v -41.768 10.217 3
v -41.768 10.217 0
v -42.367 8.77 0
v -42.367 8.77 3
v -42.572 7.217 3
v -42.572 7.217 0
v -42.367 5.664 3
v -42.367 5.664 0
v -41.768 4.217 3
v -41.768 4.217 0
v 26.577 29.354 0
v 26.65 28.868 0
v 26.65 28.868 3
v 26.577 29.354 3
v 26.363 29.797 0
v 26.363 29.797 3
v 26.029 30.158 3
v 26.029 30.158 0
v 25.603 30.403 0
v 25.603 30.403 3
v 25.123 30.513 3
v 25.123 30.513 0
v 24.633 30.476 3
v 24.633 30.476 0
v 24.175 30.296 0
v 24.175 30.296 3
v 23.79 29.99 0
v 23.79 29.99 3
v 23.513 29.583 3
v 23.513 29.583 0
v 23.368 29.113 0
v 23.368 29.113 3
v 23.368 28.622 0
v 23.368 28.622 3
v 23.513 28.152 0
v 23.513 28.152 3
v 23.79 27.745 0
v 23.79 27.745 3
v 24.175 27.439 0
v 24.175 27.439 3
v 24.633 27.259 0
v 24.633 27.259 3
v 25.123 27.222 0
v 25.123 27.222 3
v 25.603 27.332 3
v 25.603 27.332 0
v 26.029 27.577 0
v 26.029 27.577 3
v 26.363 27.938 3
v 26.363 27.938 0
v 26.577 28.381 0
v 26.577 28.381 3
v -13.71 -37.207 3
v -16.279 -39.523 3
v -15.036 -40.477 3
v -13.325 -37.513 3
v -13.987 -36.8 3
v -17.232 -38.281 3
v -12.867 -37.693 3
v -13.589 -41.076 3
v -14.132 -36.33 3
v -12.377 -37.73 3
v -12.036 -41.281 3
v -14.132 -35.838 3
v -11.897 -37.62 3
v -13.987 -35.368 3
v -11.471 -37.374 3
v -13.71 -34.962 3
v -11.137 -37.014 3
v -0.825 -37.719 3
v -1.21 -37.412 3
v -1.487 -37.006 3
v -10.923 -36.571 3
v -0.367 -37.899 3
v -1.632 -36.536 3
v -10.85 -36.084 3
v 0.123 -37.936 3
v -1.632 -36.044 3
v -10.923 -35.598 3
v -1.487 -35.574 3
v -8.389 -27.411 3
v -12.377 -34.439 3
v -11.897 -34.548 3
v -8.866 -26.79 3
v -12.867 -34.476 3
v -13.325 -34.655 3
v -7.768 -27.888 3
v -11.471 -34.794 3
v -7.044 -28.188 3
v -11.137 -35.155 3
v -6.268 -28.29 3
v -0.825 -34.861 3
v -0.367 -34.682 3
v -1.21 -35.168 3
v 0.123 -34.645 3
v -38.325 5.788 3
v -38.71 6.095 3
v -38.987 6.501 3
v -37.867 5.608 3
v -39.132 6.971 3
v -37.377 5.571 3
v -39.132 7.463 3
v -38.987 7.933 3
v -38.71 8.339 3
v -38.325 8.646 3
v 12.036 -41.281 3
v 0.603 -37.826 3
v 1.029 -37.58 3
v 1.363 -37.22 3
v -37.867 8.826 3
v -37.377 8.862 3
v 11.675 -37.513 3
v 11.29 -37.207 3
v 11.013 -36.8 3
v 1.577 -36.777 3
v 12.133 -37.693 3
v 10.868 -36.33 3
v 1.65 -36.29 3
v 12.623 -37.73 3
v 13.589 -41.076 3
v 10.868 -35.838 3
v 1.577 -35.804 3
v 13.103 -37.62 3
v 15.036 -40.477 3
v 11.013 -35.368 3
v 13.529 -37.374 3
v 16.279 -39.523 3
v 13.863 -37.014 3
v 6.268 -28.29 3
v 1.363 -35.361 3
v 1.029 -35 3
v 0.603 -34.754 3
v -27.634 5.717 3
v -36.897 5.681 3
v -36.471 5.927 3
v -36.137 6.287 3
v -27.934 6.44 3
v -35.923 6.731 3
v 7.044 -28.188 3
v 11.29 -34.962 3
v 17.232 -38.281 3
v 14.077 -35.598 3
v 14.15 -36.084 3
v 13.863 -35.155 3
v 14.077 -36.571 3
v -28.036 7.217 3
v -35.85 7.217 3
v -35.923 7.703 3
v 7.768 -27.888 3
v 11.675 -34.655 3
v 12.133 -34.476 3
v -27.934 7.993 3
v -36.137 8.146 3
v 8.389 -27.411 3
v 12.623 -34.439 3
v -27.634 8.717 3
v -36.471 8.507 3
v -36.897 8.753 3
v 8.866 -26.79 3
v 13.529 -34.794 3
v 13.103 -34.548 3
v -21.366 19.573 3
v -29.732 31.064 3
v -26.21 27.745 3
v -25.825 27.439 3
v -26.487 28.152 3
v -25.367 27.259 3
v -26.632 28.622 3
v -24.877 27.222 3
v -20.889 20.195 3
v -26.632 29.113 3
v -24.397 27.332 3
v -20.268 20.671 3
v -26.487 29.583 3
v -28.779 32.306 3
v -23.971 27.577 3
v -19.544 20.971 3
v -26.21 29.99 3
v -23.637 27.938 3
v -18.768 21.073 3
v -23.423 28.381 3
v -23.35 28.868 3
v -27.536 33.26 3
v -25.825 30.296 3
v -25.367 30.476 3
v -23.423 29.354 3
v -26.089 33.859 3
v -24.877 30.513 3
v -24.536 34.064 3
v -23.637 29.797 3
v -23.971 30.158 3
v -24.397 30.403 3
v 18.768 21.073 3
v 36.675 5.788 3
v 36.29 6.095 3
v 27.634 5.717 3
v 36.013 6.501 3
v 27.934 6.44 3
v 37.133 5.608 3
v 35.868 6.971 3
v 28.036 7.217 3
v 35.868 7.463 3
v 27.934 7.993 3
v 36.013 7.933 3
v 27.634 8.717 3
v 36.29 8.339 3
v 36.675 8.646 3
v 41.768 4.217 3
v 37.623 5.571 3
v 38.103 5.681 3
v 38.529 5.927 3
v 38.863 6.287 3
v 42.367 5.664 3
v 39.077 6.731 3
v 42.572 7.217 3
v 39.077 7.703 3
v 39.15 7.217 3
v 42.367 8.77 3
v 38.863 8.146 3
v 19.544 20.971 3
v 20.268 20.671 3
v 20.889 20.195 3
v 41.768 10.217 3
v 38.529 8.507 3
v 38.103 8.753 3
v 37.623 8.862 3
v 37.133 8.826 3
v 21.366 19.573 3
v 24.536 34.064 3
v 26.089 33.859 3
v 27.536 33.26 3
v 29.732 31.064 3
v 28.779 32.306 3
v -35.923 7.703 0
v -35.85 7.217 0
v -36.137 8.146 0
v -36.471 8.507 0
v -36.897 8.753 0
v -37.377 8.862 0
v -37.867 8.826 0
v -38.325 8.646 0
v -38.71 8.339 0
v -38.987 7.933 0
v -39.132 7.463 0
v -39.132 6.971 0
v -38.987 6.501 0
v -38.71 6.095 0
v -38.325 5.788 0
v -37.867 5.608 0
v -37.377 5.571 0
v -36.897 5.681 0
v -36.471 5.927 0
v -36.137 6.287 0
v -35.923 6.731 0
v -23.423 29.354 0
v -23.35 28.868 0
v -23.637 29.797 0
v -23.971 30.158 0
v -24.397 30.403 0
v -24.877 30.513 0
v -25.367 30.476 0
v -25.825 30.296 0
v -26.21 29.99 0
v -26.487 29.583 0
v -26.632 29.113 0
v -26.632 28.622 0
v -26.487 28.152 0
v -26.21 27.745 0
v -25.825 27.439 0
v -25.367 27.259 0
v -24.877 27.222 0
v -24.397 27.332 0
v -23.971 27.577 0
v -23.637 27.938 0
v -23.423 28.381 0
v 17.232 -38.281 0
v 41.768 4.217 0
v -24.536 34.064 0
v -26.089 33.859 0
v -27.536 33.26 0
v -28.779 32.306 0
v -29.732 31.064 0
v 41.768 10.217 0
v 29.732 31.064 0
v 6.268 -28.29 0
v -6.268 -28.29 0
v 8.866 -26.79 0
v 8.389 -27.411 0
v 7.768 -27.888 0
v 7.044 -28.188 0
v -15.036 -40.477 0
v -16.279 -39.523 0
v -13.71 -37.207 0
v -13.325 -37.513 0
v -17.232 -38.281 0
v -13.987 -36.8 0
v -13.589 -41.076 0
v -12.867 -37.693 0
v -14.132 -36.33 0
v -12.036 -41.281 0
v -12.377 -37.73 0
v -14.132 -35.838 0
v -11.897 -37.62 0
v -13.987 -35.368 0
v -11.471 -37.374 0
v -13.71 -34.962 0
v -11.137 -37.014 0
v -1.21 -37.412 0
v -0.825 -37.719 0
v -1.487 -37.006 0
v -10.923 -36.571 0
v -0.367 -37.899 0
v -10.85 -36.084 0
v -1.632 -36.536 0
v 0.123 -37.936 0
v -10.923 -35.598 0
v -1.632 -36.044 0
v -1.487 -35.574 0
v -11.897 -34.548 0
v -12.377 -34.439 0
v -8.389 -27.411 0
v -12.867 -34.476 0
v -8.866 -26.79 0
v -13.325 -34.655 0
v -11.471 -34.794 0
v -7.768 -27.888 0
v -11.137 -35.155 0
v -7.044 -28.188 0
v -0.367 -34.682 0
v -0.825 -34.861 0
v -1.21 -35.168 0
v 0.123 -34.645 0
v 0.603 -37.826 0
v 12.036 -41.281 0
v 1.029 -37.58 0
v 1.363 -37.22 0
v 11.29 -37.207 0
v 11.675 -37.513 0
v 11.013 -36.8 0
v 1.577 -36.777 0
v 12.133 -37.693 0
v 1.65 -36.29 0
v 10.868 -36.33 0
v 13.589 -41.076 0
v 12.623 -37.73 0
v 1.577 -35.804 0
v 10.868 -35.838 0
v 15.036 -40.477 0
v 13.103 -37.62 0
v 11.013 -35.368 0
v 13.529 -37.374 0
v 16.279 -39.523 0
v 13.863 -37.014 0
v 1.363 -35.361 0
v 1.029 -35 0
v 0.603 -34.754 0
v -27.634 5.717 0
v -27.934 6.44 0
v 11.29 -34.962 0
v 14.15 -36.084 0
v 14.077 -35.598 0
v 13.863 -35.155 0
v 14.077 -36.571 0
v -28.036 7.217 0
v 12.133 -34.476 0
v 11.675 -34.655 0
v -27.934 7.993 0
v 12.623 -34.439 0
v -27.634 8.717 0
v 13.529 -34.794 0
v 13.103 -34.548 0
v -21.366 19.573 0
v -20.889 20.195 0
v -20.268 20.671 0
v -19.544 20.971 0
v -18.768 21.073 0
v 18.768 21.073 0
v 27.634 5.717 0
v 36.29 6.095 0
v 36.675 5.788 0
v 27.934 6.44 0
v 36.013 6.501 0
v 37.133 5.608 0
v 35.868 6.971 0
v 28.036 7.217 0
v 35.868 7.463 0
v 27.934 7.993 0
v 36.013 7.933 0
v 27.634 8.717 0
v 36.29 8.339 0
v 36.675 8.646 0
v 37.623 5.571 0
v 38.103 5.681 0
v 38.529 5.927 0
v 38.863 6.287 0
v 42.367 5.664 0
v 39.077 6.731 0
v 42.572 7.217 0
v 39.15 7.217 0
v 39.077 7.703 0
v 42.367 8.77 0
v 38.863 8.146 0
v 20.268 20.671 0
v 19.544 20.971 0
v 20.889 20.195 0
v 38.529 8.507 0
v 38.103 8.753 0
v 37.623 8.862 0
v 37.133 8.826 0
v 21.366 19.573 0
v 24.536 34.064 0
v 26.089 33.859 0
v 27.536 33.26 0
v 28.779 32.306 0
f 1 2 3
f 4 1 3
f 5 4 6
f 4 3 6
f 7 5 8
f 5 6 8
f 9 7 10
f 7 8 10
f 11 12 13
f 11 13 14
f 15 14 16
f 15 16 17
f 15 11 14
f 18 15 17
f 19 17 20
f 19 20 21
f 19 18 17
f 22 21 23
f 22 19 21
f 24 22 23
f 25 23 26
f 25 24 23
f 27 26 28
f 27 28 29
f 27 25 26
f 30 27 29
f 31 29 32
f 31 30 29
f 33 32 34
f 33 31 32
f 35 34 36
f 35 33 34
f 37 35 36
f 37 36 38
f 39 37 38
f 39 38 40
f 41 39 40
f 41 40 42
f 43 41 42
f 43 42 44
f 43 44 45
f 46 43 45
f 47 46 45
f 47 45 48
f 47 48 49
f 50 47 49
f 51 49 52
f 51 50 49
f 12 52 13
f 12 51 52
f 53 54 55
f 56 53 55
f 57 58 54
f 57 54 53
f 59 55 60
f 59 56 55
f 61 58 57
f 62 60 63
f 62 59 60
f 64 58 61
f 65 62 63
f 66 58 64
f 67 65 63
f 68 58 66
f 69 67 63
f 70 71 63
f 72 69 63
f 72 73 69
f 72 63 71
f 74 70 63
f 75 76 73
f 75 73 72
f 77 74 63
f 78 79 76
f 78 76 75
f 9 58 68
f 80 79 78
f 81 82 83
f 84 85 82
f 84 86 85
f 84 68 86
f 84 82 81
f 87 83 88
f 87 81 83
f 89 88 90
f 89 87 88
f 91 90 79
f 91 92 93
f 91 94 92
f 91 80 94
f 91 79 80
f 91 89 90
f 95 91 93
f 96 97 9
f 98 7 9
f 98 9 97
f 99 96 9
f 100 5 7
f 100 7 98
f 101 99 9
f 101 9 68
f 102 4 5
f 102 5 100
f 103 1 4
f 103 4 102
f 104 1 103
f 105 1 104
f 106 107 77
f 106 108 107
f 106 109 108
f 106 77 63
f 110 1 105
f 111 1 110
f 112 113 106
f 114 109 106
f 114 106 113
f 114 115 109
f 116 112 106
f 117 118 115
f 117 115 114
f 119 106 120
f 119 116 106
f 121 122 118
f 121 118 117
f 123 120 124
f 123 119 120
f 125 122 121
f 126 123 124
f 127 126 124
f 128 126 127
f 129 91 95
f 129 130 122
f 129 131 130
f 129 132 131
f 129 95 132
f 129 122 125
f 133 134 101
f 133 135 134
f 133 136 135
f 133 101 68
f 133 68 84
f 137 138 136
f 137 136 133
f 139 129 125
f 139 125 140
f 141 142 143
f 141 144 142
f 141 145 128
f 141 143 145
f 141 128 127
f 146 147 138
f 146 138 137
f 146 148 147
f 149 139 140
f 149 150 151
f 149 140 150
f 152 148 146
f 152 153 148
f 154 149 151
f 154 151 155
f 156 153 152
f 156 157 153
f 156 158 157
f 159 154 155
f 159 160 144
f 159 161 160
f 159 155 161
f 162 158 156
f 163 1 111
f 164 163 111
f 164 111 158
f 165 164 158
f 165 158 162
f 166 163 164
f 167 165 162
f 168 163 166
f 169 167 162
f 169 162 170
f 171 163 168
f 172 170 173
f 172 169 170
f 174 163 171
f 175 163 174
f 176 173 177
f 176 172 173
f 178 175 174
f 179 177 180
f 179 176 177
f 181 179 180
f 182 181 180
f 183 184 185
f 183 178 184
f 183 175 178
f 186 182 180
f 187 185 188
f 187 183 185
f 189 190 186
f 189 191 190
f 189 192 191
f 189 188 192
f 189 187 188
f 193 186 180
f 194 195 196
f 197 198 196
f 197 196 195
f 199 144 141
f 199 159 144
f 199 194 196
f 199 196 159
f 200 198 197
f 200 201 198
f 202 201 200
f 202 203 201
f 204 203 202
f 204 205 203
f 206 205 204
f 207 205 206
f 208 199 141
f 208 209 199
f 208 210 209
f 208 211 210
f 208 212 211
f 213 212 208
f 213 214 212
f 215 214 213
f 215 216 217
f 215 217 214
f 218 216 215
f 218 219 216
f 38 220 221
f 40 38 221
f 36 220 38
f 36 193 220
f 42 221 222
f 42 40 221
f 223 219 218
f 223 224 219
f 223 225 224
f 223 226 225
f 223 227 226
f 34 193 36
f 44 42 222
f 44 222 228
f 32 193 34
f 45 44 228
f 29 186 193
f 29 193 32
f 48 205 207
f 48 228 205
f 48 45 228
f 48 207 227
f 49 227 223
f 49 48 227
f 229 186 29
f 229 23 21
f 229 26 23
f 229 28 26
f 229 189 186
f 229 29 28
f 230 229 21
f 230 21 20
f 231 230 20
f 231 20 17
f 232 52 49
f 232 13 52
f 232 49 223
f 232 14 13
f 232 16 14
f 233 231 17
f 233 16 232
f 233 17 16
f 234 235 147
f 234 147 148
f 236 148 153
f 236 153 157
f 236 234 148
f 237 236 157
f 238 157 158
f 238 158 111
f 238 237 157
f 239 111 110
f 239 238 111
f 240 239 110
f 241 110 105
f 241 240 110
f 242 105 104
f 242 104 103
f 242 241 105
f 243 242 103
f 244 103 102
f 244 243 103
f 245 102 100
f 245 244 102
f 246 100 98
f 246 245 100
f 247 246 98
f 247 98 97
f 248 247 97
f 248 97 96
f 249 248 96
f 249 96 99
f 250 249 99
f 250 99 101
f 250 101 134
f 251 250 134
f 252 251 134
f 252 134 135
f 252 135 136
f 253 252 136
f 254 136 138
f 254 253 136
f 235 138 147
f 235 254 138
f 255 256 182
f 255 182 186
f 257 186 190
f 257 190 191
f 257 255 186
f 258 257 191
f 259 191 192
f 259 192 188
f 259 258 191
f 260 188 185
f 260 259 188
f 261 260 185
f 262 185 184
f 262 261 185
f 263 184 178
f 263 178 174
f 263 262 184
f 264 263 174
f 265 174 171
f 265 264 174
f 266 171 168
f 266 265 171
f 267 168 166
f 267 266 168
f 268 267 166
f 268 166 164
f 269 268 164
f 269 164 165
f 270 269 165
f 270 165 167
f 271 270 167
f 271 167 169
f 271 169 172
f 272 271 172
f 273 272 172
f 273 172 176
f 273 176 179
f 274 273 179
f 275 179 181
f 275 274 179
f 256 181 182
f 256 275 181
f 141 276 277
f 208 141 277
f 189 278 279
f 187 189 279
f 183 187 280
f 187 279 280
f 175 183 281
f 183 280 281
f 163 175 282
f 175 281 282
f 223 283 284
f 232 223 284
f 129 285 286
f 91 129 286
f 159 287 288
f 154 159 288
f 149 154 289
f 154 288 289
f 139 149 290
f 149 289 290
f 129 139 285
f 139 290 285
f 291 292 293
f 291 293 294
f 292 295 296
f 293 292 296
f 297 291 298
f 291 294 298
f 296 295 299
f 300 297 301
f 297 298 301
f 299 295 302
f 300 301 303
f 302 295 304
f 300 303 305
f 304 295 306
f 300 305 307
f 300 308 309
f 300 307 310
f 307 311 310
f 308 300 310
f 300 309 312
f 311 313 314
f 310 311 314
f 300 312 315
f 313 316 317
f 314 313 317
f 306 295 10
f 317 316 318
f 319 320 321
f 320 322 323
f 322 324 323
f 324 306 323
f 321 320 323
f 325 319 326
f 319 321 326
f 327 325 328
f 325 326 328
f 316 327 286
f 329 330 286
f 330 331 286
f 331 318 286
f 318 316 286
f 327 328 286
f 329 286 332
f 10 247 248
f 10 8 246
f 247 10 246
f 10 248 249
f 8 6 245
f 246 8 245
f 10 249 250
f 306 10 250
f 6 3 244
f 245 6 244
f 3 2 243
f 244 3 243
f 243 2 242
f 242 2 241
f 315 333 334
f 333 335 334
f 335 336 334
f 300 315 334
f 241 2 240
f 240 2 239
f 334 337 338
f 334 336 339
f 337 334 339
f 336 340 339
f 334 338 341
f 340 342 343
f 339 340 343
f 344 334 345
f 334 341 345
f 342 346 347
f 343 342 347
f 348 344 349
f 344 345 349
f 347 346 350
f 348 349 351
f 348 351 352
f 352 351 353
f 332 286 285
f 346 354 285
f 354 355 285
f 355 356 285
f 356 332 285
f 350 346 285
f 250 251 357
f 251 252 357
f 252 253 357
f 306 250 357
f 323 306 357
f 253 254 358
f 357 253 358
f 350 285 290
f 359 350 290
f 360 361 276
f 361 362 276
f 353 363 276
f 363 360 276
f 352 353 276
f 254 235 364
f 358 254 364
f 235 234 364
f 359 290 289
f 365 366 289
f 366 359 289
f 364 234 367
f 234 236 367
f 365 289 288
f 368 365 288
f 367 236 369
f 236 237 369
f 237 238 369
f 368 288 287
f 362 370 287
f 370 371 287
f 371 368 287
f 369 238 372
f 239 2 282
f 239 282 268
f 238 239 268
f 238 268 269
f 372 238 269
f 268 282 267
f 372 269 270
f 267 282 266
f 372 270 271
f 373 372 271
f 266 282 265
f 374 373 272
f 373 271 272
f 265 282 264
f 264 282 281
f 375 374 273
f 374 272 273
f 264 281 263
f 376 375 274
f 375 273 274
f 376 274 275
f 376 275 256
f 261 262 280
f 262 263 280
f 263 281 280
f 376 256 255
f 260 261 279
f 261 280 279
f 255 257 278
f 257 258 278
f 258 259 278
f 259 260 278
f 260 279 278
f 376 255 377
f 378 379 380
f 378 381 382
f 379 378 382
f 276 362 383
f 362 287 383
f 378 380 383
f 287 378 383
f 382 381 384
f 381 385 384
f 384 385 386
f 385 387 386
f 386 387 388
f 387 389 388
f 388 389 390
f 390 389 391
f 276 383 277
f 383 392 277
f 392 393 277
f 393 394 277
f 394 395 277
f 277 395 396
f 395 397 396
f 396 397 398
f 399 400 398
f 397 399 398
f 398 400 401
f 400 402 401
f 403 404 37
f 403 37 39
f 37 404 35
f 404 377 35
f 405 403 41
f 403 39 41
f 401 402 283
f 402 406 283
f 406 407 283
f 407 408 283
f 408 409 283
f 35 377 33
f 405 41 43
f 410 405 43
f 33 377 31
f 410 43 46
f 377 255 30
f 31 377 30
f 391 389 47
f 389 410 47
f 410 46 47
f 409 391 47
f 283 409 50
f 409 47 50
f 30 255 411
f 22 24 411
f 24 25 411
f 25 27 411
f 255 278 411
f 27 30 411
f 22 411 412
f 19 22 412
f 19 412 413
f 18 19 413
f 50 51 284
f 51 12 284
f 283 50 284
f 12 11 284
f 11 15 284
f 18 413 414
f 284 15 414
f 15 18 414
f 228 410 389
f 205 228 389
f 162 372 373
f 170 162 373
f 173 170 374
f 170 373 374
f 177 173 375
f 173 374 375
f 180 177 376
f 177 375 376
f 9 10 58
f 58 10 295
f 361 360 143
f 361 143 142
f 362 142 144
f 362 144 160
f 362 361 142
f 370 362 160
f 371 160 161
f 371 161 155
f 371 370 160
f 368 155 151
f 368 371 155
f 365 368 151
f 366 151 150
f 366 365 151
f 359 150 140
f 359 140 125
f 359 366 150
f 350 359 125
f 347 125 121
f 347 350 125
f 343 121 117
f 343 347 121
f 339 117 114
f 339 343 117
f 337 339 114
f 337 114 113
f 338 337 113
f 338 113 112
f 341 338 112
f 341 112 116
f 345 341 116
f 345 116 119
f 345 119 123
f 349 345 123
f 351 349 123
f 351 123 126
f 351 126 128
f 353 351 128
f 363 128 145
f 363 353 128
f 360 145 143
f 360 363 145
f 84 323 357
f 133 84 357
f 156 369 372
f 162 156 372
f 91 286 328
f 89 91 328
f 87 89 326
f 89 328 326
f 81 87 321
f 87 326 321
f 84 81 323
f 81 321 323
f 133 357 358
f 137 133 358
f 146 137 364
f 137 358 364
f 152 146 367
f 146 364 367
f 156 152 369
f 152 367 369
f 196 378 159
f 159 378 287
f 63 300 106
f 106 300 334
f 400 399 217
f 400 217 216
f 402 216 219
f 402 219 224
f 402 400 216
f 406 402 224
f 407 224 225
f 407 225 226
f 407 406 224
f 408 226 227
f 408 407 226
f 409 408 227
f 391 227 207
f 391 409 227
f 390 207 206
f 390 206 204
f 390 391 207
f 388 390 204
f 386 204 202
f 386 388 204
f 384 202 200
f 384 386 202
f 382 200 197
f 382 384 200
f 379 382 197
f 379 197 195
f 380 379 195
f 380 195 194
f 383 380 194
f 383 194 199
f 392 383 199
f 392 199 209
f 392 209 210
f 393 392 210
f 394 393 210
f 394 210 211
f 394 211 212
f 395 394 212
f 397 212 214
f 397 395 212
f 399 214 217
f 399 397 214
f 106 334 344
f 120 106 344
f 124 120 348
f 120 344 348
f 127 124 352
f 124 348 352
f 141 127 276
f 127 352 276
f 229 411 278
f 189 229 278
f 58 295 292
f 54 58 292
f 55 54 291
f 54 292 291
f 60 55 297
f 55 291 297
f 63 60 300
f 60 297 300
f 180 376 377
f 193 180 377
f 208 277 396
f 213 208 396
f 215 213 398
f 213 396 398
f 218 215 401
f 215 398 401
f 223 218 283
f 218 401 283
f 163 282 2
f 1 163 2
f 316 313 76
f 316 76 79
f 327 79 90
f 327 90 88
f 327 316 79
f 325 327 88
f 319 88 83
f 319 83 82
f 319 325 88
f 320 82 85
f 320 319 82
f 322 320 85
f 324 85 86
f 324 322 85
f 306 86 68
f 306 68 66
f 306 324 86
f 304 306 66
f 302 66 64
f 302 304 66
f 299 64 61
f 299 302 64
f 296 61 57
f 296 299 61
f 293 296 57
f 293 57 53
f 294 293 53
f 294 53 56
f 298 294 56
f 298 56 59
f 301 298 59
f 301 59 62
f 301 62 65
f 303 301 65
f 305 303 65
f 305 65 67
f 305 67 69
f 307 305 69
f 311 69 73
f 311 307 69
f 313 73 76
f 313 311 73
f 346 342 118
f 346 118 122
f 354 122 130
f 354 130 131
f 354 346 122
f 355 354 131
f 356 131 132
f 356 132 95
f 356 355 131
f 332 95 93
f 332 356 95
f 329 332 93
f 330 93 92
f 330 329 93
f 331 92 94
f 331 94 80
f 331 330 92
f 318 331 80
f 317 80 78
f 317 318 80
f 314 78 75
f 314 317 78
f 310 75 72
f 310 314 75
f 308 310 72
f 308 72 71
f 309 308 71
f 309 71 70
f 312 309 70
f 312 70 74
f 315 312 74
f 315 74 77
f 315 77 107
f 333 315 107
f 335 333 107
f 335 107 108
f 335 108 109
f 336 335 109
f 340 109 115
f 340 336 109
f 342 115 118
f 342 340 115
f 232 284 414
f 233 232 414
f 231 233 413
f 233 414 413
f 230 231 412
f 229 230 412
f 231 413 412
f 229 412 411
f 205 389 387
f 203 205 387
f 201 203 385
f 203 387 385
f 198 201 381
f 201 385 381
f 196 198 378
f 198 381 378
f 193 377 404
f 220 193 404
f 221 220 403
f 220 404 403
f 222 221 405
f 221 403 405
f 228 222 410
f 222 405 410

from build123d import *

# Parameters (mm, degrees)
F0_R     = 1.65
F1_DEPTH = 3


with BuildPart() as f1:
    # F0 (on Top) → F1 (new body)
    with BuildSketch(Plane.XY):
        with BuildLine():
            ThreePointArc((-24.535898, 34.063666), (-27.535898, 33.259818), (-29.732051, 31.063666))
            Line((-29.732051, 31.063666), (-41.767949, 10.216878))
            ThreePointArc((-41.767949, 10.216878), (-42.571797, 7.216878), (-41.767949, 4.216878))
            Line((-41.767949, 4.216878), (-17.232051, -38.280544))
            ThreePointArc((-17.232051, -38.280544), (-15.035898, -40.476697), (-12.035898, -41.280544))
            Line((-12.035898, -41.280544), (12.035898, -41.280544))
            ThreePointArc((12.035898, -41.280544), (15.035898, -40.476697), (17.232051, -38.280544))
            Line((17.232051, -38.280544), (41.767949, 4.216878))
            ThreePointArc((41.767949, 4.216878), (42.571797, 7.216878), (41.767949, 10.216878))
            Line((41.767949, 10.216878), (29.732051, 31.063666))
            ThreePointArc((29.732051, 31.063666), (27.535898, 33.259818), (24.535898, 34.063666))
            Line((24.535898, 34.063666), (-24.535898, 34.063666))
        make_face()
        with Locations((-12.5, -36.084392)):
            Circle(F0_R, mode=Mode.SUBTRACT)
        with Locations((0, -36.290163)):
            Circle(F0_R, mode=Mode.SUBTRACT)
        with Locations((12.5, -36.084392)):
            Circle(F0_R, mode=Mode.SUBTRACT)
        with BuildLine():
            Line((6.267949, -28.290163), (-6.267949, -28.290163))
            ThreePointArc((-6.267949, -28.290163), (-7.767949, -27.888239), (-8.866025, -26.790163))
            Line((-8.866025, -26.790163), (-27.633975, 5.716878))
            ThreePointArc((-27.633975, 5.716878), (-28.035898, 7.216878), (-27.633975, 8.716878))
            Line((-27.633975, 8.716878), (-21.366025, 19.573285))
            ThreePointArc((-21.366025, 19.573285), (-20.267949, 20.671361), (-18.767949, 21.073285))
            Line((-18.767949, 21.073285), (18.767949, 21.073285))
            ThreePointArc((18.767949, 21.073285), (20.267949, 20.671361), (21.366025, 19.573285))
            Line((21.366025, 19.573285), (27.633975, 8.716878))
            ThreePointArc((27.633975, 8.716878), (28.035898, 7.216878), (27.633975, 5.716878))
            Line((27.633975, 5.716878), (8.866025, -26.790163))
            ThreePointArc((8.866025, -26.790163), (7.767949, -27.888239), (6.267949, -28.290163))
        make_face(mode=Mode.SUBTRACT)
        with Locations((-37.5, 7.216878)):
            Circle(F0_R, mode=Mode.SUBTRACT)
        with Locations((-25, 28.867513)):
            Circle(F0_R, mode=Mode.SUBTRACT)
        with Locations((37.5, 7.216878)):
            Circle(F0_R, mode=Mode.SUBTRACT)
        with Locations((25, 28.867513)):
            Circle(F0_R, mode=Mode.SUBTRACT)
    extrude(amount=F1_DEPTH)


solid = f1.part
